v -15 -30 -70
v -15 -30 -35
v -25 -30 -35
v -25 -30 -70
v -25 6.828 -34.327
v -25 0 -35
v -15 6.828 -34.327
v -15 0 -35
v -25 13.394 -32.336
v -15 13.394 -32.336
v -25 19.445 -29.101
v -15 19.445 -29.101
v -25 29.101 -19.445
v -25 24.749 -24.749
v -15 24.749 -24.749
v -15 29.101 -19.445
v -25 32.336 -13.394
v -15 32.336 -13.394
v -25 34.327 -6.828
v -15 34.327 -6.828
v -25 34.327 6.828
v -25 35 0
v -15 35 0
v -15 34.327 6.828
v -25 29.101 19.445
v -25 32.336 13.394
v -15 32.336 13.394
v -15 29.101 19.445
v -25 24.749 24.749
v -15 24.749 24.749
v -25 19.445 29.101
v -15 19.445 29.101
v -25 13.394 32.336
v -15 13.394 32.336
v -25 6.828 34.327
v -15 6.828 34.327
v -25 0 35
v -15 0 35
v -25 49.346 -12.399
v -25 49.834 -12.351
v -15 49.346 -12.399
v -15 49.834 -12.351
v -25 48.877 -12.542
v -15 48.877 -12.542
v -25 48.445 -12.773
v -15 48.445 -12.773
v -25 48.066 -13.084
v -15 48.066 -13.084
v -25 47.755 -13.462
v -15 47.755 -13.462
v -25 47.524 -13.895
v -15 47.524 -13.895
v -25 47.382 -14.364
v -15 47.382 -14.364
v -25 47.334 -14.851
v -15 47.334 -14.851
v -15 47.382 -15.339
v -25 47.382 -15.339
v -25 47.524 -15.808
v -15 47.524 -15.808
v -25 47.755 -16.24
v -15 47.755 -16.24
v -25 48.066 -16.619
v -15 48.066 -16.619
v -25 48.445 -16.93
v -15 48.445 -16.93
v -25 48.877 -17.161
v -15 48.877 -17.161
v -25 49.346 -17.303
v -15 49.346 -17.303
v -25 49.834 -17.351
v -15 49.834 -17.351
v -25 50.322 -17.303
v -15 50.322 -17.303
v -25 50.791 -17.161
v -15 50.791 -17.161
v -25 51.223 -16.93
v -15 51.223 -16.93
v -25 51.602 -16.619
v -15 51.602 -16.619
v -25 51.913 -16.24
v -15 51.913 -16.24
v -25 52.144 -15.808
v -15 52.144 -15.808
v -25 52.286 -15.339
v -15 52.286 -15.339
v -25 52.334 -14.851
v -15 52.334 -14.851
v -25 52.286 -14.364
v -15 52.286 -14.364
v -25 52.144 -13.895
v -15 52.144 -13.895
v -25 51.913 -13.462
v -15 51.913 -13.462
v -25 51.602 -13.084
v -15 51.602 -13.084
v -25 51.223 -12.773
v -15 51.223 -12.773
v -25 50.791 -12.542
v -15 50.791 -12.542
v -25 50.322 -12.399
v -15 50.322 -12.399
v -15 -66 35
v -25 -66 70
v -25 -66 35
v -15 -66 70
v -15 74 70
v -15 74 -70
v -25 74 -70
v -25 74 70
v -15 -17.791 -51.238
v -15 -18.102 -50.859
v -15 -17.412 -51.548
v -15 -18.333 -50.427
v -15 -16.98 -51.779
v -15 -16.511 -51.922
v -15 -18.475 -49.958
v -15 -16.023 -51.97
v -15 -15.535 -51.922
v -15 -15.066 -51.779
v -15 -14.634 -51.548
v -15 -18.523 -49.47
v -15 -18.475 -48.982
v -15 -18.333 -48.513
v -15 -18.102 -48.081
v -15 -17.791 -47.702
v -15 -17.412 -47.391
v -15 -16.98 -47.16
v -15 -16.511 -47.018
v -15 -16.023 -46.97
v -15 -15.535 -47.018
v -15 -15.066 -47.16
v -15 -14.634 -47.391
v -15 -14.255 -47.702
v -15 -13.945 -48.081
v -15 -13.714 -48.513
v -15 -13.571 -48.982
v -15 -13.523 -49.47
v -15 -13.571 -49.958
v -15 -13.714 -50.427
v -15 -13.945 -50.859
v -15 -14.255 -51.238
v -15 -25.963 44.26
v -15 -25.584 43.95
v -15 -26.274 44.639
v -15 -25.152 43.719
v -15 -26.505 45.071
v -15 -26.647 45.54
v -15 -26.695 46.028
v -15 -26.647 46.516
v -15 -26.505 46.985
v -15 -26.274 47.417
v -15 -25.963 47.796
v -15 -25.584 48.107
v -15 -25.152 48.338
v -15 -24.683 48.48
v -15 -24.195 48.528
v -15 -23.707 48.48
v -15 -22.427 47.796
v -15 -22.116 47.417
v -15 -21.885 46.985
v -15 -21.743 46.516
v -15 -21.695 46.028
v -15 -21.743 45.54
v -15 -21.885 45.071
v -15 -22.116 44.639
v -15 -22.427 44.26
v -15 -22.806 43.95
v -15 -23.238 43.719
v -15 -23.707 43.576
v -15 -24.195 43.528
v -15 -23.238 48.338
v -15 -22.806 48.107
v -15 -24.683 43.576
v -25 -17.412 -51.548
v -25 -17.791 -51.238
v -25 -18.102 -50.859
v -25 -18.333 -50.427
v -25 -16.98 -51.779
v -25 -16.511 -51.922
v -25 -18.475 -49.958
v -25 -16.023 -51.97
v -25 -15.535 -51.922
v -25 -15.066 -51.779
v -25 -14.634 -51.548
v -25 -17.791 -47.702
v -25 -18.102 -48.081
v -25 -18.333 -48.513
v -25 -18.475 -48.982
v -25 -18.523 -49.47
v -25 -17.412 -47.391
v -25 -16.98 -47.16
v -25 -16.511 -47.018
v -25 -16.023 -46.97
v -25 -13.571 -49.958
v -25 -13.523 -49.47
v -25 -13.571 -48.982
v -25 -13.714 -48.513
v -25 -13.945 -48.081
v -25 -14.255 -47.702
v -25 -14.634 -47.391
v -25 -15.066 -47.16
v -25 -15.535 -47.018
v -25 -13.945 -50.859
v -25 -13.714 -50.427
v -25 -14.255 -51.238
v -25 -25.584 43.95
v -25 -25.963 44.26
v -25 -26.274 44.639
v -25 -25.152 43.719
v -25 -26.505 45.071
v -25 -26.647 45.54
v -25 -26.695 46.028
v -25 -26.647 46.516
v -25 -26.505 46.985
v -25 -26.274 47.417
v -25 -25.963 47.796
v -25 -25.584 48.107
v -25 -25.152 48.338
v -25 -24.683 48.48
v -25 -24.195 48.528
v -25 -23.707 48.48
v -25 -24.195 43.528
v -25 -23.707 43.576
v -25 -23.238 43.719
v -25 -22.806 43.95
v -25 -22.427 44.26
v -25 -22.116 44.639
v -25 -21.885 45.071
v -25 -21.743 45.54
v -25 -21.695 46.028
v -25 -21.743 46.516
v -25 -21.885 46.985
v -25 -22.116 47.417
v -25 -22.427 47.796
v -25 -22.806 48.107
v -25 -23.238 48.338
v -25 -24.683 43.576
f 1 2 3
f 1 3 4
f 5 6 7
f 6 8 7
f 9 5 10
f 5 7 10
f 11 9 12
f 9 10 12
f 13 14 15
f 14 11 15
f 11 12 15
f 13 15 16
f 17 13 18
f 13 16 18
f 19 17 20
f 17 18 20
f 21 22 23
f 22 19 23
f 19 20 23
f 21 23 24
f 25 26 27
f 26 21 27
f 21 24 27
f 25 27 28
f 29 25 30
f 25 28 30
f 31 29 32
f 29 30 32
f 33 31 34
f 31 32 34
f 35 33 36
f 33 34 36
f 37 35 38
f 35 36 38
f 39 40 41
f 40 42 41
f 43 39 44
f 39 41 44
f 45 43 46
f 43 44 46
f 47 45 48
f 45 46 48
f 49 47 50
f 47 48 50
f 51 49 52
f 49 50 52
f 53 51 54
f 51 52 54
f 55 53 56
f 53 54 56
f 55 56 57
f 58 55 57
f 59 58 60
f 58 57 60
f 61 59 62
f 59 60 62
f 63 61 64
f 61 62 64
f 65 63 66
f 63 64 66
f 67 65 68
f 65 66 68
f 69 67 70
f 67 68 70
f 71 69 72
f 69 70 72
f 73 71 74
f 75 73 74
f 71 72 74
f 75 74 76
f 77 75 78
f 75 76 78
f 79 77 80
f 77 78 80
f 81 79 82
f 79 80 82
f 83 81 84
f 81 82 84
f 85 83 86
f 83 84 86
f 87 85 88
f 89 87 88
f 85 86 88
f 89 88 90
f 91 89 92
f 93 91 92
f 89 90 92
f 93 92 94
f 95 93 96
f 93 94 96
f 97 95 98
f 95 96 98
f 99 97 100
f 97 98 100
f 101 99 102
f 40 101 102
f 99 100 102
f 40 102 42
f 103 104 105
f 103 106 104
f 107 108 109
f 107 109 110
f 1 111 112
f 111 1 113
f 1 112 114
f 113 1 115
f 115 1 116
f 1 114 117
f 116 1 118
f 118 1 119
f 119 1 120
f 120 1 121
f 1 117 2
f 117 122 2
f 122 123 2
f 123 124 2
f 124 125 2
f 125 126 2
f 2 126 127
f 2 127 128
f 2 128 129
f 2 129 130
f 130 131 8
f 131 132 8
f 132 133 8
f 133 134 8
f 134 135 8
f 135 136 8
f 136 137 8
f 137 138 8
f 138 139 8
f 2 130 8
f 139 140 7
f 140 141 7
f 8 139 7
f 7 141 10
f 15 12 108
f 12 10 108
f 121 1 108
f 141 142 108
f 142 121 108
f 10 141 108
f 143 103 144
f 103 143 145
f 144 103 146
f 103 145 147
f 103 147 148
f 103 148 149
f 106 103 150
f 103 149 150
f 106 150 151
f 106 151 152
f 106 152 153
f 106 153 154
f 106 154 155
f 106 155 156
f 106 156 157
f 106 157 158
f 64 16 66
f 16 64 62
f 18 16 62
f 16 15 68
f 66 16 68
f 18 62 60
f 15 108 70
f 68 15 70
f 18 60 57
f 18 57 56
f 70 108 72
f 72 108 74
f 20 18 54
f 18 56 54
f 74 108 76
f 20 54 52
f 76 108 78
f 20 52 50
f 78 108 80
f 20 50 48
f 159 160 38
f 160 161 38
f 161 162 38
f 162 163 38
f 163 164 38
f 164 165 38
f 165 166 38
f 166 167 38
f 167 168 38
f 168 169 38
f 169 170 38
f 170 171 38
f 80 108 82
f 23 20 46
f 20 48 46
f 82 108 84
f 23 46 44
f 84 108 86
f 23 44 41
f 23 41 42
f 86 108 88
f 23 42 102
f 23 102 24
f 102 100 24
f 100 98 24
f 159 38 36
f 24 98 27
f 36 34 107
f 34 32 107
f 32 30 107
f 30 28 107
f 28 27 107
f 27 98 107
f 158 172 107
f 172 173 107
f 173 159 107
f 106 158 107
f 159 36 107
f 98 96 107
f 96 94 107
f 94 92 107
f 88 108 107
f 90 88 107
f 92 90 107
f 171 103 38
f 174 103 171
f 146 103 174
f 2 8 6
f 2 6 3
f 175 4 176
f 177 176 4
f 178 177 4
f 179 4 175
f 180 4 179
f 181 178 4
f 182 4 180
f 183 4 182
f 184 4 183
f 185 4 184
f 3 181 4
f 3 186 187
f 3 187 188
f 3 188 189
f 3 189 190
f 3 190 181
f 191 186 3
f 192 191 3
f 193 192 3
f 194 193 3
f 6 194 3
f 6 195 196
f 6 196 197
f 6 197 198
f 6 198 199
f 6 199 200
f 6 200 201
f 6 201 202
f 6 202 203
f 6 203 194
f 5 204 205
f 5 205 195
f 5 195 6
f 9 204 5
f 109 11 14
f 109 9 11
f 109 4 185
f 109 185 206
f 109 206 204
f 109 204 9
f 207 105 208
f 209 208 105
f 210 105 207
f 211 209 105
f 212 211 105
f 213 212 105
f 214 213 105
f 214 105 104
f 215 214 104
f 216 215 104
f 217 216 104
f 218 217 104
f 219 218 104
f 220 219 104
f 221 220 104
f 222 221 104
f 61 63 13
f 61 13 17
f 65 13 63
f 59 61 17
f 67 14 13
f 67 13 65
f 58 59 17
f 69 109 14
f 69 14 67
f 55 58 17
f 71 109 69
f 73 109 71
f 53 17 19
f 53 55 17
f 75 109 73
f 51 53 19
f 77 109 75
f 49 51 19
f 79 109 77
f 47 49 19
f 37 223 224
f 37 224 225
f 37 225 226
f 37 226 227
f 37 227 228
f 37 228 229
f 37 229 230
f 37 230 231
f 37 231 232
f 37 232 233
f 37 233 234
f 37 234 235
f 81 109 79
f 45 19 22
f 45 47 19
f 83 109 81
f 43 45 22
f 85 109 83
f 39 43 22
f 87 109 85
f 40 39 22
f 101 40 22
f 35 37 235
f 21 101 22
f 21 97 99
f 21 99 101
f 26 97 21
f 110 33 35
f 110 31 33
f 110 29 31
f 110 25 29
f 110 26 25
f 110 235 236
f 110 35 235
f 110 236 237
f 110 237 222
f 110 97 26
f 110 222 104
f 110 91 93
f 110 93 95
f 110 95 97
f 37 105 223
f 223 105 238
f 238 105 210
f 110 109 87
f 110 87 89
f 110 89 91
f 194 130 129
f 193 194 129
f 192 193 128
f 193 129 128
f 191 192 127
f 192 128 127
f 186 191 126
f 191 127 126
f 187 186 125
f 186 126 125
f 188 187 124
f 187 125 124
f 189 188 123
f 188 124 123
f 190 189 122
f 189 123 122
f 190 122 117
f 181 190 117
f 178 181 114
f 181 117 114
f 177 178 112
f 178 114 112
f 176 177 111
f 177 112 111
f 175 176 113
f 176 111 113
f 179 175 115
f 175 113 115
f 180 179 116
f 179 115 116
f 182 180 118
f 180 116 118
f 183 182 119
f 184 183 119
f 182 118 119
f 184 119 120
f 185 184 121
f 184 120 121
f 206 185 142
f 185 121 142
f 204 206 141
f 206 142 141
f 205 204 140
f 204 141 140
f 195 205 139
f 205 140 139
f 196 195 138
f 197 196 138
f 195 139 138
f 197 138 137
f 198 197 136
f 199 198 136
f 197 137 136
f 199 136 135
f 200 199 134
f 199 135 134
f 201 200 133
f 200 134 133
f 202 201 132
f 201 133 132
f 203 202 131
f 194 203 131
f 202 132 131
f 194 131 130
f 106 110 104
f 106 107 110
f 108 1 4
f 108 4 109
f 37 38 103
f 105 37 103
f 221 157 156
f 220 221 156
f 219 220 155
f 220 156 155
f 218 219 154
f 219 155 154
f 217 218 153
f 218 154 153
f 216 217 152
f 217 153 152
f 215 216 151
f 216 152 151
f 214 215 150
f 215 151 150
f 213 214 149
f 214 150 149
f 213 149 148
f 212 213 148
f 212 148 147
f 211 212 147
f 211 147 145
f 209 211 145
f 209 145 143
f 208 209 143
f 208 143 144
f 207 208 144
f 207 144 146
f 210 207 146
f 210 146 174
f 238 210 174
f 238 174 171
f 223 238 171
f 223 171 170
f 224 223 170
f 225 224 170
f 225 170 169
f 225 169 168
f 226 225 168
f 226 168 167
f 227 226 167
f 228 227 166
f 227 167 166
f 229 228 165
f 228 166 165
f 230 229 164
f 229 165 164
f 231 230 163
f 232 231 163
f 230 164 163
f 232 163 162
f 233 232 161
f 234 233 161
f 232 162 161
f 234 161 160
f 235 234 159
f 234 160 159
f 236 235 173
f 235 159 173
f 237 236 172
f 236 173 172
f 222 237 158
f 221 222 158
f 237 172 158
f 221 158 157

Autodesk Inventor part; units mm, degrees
ref_plane "YZ Plane" through (0, 0, 0) normal (1, 0, 0) x (0, 1, 0)
ref_plane "РабПлоскость8" through (-15, 0, 0) normal (-1, 0, 0) x (0, 0, 1)
sketch "Эскиз6" plane through (-15, 0, 0) normal (-1, 0, 0) x (0, 0, 1)
  line L0 (0, 0) -> (0, -66)
  line L1 (0, -66) -> (-70, -66)
  line L2 (-70, -66) -> (-70, 74)
  line L3 (-70, 74) -> (70, 74)
  line L4 (70, 74) -> (70, -66)
  line L5 (70, -66) -> (0, -66)
  circle A0 centre (0, 0) radius 3 projected
  circle A1 centre (-14.8513, 49.8341) radius 2.5 projected
  circle A2 centre (0, 0) radius 52
  line L6 (70, 0) -> (70, 30)
  line L7 (70, 0) -> (70, -20)
  circle A3 centre (0, 0) radius 35
  circle A4 centre (0, 0) radius 35 projected
  line L8 (0, 0) -> (70, 0)
  circle A5 centre (-14.8513, 49.8341) radius 2.5
  line L9 (-70, 74) -> (-73, 74)
  line L10 (-70, 89) -> (-70, 74)
  line L11 (-70, 74) -> (-67, 74)
  line L12 (-67, 74) -> (-67, 89)
  line L13 (-67, 89) -> (-70, 89)
  line L14 (-70, -66) -> (-70, -81)
  line L15 (-70, -81) -> (-67, -81)
  line L16 (-67, -81) -> (-67, -66)
  circle A6 centre (46.0282, -24.1951) radius 2.5 projected
  circle A7 centre (46.0282, -24.1951) radius 2.5
  line L17 (0, 74) -> (-30, 74)
  line L18 (-35, 0) -> (-35, 74)
  line L19 (-35, 0) -> (-35, -30)
  line L20 (-35, -30) -> (-70, -30)
  line L21 (35, 0) -> (35, -66)
  arc A8 (-56.6592, -9.0725) -> (-41.4997, -22.0629) centre (-49.4698, -16.0232) ccw projected
  circle A9 centre (-49.4698, -16.0232) radius 2.5
  point P0 (-1.4375, -51.9801)
  point P1 (38.1911, 35.2908)
  point P2 (0, -35)
  point P3 (35, 0)
  dimension "d36" = 66
  dimension "d37" = 70
  dimension "d38" = 140
  dimension "d39" = 140
  dimension "d45" = 3
  dimension "d46" = 15
  dimension "d47" = 15
  dimension "d48" = 3
  dimension "d49" = 30
  dimension "d54" = 30
extrude "Выдавливание5" add sketch "Эскиз6" along normal blind 10 contours A3 L18 A2 A1 L8 | L8 A2 A6 L21 | L19 L20 A2 A9 L18 | L8 L4 L5 L21 A2 A6 | A2 A1 L18 L3 L4 L8 | L20 L2 L3 L18 A2 A9
ref_plane "РабПлоскость7" through (-25, 0, 0) normal (-1, 0, 0) x (0, 0, 1)
sketch "Эскиз7" plane through (-25, 0, 0) normal (-1, 0, 0) x (0, 0, 1)
  line L0 (-70, 74) -> (-70, -30) projected
  line L1 (-70, -30) -> (-35, -30) projected
  line L2 (-35, -30) -> (-35, 0) projected
  circle A0 centre (-49.4698, -16.0232) radius 2.5 projected
  arc A1 (35, 0) -> (-35, 0) centre (0, 0) ccw projected
  line L3 (70, 74) -> (-70, 74) projected
  line L4 (70, -66) -> (70, 74) projected
  line L5 (35, 0) -> (35, -66) projected
  line L6 (35, -66) -> (70, -66) projected
  circle A2 centre (46.0282, -24.1951) radius 2.5 projected
  circle A3 centre (-14.8513, 49.8341) radius 2.5 projected
  circle A4 centre (0, 0) radius 3 projected
  circle A5 centre (-14.8513, 49.8341) radius 2.5 projected
  circle A6 centre (0, 0) radius 52
  circle A7 centre (0, 0) radius 43.5 projected
  circle A8 centre (0, 0) radius 43.5 projected
  circle A9 centre (46.0282, -24.1951) radius 2.5 projected
  line L7 (0, 0) -> (46.0282, -24.1951)
  line L8 (46.0282, -24.1951) -> (46.0282, 0)
  line L9 (-14.8513, 49.8341) -> (0, 49.8341)
  arc A10 (28.4229, 37.4318) -> (-5.3572, 46.6937) centre (0, 0) ccw projected
  line L10 (0, 49.8341) -> (0, 0)
  circle A11 centre (-49.4698, -16.0232) radius 2.5 projected
  line L11 (0, 0) -> (-49.4698, -16.0232)
  line L12 (-49.4698, -16.0232) -> (-49.4995, -0.2197)
  circle A12 centre (-51.9995, -0.2244) radius 2.5 projected
  dimension "d57" = 104
  dimension "d55" = 104
  dimension "d56" = 140
  dimension "d58" = 35
  dimension "d59" = 87
  dimension "d60" = 24.1951
  dimension "d61" = 46.0282
  dimension "d62" = 49.8341
  dimension "d63" = 14.8513
  dimension "d64" = 15.8034
  dimension "d65" = 49.4999
properties part number "Двигатель ущербный"
